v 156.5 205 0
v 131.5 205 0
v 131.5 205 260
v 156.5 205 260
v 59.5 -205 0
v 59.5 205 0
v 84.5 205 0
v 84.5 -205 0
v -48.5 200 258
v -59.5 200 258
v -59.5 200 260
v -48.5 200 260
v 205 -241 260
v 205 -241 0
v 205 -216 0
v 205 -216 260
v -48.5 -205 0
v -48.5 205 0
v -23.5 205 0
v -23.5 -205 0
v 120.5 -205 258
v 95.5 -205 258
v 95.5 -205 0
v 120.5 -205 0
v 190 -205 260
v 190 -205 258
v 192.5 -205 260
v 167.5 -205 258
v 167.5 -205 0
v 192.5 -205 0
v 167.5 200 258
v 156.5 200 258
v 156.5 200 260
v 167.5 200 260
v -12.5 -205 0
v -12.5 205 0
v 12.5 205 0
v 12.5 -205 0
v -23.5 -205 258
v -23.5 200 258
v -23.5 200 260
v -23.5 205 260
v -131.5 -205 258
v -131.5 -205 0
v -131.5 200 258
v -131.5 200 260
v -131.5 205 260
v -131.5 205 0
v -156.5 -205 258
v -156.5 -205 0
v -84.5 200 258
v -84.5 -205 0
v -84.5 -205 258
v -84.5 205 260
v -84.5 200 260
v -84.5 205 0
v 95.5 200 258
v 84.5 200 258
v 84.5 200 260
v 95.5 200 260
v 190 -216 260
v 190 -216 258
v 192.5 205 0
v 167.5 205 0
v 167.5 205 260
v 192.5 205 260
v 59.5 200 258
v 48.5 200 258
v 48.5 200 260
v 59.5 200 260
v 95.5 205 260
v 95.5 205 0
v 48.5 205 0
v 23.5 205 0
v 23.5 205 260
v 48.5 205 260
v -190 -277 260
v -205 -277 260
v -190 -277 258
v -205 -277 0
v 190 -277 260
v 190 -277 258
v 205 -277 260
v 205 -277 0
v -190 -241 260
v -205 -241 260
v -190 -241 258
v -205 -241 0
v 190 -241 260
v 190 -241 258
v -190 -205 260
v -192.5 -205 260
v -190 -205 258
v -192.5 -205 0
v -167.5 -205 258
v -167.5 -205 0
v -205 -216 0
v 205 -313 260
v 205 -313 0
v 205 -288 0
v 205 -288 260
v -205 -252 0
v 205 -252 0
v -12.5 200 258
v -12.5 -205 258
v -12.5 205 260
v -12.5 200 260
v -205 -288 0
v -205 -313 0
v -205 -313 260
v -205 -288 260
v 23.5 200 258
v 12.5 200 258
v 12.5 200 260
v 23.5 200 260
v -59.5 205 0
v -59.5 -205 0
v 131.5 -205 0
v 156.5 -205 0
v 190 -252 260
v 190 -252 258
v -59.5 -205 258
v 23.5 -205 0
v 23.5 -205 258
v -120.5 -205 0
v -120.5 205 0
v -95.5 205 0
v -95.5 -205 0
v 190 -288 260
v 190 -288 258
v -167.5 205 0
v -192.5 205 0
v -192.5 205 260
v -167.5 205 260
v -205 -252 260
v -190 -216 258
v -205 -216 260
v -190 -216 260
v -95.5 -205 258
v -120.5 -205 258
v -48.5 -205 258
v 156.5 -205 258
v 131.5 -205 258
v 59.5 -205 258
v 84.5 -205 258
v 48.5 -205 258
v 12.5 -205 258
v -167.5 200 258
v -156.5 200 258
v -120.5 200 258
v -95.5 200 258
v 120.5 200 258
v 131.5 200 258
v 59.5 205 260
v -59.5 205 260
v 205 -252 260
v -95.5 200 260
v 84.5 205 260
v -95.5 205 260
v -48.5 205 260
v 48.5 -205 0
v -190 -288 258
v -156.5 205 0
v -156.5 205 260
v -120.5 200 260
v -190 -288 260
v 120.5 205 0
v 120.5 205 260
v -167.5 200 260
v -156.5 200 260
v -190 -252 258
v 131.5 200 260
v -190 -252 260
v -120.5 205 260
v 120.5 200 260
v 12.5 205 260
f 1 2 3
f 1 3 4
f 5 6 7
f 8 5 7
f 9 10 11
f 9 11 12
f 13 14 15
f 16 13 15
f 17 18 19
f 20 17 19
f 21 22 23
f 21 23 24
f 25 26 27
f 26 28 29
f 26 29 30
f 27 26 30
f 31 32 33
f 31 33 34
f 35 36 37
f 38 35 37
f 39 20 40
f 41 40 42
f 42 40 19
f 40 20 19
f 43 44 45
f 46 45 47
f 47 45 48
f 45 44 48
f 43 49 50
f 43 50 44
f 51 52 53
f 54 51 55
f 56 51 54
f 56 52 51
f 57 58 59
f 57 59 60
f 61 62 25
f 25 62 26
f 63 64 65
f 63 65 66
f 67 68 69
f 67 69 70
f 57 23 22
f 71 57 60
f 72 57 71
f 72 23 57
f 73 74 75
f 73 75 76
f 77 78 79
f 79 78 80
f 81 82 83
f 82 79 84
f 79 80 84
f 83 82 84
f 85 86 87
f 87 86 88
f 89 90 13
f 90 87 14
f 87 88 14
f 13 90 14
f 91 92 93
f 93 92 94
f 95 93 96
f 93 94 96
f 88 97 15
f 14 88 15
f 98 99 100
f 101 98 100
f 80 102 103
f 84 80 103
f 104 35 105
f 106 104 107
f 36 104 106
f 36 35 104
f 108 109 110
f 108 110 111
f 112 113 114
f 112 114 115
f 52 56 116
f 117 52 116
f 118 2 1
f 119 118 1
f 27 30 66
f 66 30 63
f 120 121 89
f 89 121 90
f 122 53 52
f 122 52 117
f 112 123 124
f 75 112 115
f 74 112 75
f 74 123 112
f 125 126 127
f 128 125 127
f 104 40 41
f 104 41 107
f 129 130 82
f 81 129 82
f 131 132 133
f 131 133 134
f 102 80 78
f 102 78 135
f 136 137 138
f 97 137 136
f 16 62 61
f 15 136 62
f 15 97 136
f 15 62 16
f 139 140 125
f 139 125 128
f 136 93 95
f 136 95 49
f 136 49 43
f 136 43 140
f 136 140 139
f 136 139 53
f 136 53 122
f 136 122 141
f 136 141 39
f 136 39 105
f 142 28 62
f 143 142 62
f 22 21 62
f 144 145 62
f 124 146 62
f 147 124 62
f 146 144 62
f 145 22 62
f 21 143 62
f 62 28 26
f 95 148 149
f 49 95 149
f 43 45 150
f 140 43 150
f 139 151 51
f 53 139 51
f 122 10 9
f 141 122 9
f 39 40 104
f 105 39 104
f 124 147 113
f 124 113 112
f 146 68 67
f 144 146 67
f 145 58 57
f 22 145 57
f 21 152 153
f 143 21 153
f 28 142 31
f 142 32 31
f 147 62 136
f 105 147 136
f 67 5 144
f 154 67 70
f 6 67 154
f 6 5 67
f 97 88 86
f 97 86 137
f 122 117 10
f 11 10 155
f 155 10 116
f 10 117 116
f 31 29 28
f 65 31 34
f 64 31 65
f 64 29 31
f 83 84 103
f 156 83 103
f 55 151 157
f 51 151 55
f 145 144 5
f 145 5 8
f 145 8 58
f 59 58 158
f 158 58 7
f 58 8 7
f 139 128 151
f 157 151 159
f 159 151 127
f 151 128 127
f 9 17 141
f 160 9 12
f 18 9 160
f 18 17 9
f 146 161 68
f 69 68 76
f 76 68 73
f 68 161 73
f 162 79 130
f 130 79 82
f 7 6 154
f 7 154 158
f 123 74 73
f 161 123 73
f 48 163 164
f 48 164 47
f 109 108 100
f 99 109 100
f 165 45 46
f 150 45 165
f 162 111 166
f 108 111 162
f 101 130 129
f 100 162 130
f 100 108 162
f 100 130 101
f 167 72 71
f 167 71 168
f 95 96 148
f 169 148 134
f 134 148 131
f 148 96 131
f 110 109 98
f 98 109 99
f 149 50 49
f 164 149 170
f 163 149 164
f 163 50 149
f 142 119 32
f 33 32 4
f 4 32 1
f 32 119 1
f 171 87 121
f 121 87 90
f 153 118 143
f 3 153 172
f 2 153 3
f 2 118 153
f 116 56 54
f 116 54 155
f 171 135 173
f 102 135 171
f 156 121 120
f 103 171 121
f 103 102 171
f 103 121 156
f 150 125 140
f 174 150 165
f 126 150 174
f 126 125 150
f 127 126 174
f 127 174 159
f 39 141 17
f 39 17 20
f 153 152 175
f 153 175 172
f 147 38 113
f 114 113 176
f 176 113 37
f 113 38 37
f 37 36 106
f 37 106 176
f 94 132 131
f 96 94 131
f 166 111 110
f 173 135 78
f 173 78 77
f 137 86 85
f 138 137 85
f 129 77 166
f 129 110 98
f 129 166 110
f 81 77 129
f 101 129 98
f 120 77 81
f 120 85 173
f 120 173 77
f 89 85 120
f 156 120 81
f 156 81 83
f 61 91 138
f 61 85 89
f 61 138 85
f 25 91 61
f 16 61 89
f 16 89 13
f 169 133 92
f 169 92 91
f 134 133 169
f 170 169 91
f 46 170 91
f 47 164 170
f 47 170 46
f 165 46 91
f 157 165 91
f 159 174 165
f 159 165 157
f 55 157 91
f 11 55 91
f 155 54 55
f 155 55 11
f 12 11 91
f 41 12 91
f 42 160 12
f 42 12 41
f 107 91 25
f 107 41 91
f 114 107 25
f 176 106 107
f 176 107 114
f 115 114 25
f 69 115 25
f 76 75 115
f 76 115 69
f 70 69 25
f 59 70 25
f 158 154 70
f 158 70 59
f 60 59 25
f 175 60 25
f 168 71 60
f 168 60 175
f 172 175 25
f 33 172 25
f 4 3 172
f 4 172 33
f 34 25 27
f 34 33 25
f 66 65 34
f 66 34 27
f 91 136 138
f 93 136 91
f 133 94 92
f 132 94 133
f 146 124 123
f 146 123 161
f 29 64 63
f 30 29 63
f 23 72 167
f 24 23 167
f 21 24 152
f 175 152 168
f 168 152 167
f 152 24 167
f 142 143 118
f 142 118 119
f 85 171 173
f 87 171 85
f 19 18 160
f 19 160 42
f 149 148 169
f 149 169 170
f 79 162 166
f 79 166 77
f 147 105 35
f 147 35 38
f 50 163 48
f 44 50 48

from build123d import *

# Parameters (mm, degrees)
F1_W     = 380
F1_H     = 500
F2_DEPTH = 2
F3_W     = 25
F3_H     = 410
F3_W_2   = 410
F3_H_2   = 25
F4_DEPTH = 260


with BuildPart() as f2:
    # F1 (on offset) → F2 (new body)
    with BuildSketch(Plane.XY.offset(258)):
        with Locations((0, -50)):
            Rectangle(F1_W, F1_H)
    extrude(amount=F2_DEPTH)

    # F3 (on Top) → F4 (join)
    with BuildSketch(Plane.XY):
        Rectangle(F3_W, F3_H)
        with Locations((36, 0)):
            Rectangle(F3_W, F3_H)
        with Locations((72, 0)):
            Rectangle(F3_W, F3_H)
        with Locations((108, 0)):
            Rectangle(F3_W, F3_H)
        with Locations((144, 0)):
            Rectangle(F3_W, F3_H)
        with Locations((180, 0)):
            Rectangle(F3_W, F3_H)
        with Locations((-36, 0)):
            Rectangle(F3_W, F3_H)
        with Locations((-72, 0)):
            Rectangle(F3_W, F3_H)
        with Locations((-108, 0)):
            Rectangle(F3_W, F3_H)
        with Locations((-144, 0)):
            Rectangle(F3_W, F3_H)
        with Locations((-180, 0)):
            Rectangle(F3_W, F3_H)
        with Locations((0, -228.5)):
            Rectangle(F3_W_2, F3_H_2)
        with Locations((0, -264.5)):
            Rectangle(F3_W_2, F3_H_2)
        with Locations((0, -300.5)):
            Rectangle(F3_W_2, F3_H_2)
    extrude(amount=F4_DEPTH)


solid = f2.part
